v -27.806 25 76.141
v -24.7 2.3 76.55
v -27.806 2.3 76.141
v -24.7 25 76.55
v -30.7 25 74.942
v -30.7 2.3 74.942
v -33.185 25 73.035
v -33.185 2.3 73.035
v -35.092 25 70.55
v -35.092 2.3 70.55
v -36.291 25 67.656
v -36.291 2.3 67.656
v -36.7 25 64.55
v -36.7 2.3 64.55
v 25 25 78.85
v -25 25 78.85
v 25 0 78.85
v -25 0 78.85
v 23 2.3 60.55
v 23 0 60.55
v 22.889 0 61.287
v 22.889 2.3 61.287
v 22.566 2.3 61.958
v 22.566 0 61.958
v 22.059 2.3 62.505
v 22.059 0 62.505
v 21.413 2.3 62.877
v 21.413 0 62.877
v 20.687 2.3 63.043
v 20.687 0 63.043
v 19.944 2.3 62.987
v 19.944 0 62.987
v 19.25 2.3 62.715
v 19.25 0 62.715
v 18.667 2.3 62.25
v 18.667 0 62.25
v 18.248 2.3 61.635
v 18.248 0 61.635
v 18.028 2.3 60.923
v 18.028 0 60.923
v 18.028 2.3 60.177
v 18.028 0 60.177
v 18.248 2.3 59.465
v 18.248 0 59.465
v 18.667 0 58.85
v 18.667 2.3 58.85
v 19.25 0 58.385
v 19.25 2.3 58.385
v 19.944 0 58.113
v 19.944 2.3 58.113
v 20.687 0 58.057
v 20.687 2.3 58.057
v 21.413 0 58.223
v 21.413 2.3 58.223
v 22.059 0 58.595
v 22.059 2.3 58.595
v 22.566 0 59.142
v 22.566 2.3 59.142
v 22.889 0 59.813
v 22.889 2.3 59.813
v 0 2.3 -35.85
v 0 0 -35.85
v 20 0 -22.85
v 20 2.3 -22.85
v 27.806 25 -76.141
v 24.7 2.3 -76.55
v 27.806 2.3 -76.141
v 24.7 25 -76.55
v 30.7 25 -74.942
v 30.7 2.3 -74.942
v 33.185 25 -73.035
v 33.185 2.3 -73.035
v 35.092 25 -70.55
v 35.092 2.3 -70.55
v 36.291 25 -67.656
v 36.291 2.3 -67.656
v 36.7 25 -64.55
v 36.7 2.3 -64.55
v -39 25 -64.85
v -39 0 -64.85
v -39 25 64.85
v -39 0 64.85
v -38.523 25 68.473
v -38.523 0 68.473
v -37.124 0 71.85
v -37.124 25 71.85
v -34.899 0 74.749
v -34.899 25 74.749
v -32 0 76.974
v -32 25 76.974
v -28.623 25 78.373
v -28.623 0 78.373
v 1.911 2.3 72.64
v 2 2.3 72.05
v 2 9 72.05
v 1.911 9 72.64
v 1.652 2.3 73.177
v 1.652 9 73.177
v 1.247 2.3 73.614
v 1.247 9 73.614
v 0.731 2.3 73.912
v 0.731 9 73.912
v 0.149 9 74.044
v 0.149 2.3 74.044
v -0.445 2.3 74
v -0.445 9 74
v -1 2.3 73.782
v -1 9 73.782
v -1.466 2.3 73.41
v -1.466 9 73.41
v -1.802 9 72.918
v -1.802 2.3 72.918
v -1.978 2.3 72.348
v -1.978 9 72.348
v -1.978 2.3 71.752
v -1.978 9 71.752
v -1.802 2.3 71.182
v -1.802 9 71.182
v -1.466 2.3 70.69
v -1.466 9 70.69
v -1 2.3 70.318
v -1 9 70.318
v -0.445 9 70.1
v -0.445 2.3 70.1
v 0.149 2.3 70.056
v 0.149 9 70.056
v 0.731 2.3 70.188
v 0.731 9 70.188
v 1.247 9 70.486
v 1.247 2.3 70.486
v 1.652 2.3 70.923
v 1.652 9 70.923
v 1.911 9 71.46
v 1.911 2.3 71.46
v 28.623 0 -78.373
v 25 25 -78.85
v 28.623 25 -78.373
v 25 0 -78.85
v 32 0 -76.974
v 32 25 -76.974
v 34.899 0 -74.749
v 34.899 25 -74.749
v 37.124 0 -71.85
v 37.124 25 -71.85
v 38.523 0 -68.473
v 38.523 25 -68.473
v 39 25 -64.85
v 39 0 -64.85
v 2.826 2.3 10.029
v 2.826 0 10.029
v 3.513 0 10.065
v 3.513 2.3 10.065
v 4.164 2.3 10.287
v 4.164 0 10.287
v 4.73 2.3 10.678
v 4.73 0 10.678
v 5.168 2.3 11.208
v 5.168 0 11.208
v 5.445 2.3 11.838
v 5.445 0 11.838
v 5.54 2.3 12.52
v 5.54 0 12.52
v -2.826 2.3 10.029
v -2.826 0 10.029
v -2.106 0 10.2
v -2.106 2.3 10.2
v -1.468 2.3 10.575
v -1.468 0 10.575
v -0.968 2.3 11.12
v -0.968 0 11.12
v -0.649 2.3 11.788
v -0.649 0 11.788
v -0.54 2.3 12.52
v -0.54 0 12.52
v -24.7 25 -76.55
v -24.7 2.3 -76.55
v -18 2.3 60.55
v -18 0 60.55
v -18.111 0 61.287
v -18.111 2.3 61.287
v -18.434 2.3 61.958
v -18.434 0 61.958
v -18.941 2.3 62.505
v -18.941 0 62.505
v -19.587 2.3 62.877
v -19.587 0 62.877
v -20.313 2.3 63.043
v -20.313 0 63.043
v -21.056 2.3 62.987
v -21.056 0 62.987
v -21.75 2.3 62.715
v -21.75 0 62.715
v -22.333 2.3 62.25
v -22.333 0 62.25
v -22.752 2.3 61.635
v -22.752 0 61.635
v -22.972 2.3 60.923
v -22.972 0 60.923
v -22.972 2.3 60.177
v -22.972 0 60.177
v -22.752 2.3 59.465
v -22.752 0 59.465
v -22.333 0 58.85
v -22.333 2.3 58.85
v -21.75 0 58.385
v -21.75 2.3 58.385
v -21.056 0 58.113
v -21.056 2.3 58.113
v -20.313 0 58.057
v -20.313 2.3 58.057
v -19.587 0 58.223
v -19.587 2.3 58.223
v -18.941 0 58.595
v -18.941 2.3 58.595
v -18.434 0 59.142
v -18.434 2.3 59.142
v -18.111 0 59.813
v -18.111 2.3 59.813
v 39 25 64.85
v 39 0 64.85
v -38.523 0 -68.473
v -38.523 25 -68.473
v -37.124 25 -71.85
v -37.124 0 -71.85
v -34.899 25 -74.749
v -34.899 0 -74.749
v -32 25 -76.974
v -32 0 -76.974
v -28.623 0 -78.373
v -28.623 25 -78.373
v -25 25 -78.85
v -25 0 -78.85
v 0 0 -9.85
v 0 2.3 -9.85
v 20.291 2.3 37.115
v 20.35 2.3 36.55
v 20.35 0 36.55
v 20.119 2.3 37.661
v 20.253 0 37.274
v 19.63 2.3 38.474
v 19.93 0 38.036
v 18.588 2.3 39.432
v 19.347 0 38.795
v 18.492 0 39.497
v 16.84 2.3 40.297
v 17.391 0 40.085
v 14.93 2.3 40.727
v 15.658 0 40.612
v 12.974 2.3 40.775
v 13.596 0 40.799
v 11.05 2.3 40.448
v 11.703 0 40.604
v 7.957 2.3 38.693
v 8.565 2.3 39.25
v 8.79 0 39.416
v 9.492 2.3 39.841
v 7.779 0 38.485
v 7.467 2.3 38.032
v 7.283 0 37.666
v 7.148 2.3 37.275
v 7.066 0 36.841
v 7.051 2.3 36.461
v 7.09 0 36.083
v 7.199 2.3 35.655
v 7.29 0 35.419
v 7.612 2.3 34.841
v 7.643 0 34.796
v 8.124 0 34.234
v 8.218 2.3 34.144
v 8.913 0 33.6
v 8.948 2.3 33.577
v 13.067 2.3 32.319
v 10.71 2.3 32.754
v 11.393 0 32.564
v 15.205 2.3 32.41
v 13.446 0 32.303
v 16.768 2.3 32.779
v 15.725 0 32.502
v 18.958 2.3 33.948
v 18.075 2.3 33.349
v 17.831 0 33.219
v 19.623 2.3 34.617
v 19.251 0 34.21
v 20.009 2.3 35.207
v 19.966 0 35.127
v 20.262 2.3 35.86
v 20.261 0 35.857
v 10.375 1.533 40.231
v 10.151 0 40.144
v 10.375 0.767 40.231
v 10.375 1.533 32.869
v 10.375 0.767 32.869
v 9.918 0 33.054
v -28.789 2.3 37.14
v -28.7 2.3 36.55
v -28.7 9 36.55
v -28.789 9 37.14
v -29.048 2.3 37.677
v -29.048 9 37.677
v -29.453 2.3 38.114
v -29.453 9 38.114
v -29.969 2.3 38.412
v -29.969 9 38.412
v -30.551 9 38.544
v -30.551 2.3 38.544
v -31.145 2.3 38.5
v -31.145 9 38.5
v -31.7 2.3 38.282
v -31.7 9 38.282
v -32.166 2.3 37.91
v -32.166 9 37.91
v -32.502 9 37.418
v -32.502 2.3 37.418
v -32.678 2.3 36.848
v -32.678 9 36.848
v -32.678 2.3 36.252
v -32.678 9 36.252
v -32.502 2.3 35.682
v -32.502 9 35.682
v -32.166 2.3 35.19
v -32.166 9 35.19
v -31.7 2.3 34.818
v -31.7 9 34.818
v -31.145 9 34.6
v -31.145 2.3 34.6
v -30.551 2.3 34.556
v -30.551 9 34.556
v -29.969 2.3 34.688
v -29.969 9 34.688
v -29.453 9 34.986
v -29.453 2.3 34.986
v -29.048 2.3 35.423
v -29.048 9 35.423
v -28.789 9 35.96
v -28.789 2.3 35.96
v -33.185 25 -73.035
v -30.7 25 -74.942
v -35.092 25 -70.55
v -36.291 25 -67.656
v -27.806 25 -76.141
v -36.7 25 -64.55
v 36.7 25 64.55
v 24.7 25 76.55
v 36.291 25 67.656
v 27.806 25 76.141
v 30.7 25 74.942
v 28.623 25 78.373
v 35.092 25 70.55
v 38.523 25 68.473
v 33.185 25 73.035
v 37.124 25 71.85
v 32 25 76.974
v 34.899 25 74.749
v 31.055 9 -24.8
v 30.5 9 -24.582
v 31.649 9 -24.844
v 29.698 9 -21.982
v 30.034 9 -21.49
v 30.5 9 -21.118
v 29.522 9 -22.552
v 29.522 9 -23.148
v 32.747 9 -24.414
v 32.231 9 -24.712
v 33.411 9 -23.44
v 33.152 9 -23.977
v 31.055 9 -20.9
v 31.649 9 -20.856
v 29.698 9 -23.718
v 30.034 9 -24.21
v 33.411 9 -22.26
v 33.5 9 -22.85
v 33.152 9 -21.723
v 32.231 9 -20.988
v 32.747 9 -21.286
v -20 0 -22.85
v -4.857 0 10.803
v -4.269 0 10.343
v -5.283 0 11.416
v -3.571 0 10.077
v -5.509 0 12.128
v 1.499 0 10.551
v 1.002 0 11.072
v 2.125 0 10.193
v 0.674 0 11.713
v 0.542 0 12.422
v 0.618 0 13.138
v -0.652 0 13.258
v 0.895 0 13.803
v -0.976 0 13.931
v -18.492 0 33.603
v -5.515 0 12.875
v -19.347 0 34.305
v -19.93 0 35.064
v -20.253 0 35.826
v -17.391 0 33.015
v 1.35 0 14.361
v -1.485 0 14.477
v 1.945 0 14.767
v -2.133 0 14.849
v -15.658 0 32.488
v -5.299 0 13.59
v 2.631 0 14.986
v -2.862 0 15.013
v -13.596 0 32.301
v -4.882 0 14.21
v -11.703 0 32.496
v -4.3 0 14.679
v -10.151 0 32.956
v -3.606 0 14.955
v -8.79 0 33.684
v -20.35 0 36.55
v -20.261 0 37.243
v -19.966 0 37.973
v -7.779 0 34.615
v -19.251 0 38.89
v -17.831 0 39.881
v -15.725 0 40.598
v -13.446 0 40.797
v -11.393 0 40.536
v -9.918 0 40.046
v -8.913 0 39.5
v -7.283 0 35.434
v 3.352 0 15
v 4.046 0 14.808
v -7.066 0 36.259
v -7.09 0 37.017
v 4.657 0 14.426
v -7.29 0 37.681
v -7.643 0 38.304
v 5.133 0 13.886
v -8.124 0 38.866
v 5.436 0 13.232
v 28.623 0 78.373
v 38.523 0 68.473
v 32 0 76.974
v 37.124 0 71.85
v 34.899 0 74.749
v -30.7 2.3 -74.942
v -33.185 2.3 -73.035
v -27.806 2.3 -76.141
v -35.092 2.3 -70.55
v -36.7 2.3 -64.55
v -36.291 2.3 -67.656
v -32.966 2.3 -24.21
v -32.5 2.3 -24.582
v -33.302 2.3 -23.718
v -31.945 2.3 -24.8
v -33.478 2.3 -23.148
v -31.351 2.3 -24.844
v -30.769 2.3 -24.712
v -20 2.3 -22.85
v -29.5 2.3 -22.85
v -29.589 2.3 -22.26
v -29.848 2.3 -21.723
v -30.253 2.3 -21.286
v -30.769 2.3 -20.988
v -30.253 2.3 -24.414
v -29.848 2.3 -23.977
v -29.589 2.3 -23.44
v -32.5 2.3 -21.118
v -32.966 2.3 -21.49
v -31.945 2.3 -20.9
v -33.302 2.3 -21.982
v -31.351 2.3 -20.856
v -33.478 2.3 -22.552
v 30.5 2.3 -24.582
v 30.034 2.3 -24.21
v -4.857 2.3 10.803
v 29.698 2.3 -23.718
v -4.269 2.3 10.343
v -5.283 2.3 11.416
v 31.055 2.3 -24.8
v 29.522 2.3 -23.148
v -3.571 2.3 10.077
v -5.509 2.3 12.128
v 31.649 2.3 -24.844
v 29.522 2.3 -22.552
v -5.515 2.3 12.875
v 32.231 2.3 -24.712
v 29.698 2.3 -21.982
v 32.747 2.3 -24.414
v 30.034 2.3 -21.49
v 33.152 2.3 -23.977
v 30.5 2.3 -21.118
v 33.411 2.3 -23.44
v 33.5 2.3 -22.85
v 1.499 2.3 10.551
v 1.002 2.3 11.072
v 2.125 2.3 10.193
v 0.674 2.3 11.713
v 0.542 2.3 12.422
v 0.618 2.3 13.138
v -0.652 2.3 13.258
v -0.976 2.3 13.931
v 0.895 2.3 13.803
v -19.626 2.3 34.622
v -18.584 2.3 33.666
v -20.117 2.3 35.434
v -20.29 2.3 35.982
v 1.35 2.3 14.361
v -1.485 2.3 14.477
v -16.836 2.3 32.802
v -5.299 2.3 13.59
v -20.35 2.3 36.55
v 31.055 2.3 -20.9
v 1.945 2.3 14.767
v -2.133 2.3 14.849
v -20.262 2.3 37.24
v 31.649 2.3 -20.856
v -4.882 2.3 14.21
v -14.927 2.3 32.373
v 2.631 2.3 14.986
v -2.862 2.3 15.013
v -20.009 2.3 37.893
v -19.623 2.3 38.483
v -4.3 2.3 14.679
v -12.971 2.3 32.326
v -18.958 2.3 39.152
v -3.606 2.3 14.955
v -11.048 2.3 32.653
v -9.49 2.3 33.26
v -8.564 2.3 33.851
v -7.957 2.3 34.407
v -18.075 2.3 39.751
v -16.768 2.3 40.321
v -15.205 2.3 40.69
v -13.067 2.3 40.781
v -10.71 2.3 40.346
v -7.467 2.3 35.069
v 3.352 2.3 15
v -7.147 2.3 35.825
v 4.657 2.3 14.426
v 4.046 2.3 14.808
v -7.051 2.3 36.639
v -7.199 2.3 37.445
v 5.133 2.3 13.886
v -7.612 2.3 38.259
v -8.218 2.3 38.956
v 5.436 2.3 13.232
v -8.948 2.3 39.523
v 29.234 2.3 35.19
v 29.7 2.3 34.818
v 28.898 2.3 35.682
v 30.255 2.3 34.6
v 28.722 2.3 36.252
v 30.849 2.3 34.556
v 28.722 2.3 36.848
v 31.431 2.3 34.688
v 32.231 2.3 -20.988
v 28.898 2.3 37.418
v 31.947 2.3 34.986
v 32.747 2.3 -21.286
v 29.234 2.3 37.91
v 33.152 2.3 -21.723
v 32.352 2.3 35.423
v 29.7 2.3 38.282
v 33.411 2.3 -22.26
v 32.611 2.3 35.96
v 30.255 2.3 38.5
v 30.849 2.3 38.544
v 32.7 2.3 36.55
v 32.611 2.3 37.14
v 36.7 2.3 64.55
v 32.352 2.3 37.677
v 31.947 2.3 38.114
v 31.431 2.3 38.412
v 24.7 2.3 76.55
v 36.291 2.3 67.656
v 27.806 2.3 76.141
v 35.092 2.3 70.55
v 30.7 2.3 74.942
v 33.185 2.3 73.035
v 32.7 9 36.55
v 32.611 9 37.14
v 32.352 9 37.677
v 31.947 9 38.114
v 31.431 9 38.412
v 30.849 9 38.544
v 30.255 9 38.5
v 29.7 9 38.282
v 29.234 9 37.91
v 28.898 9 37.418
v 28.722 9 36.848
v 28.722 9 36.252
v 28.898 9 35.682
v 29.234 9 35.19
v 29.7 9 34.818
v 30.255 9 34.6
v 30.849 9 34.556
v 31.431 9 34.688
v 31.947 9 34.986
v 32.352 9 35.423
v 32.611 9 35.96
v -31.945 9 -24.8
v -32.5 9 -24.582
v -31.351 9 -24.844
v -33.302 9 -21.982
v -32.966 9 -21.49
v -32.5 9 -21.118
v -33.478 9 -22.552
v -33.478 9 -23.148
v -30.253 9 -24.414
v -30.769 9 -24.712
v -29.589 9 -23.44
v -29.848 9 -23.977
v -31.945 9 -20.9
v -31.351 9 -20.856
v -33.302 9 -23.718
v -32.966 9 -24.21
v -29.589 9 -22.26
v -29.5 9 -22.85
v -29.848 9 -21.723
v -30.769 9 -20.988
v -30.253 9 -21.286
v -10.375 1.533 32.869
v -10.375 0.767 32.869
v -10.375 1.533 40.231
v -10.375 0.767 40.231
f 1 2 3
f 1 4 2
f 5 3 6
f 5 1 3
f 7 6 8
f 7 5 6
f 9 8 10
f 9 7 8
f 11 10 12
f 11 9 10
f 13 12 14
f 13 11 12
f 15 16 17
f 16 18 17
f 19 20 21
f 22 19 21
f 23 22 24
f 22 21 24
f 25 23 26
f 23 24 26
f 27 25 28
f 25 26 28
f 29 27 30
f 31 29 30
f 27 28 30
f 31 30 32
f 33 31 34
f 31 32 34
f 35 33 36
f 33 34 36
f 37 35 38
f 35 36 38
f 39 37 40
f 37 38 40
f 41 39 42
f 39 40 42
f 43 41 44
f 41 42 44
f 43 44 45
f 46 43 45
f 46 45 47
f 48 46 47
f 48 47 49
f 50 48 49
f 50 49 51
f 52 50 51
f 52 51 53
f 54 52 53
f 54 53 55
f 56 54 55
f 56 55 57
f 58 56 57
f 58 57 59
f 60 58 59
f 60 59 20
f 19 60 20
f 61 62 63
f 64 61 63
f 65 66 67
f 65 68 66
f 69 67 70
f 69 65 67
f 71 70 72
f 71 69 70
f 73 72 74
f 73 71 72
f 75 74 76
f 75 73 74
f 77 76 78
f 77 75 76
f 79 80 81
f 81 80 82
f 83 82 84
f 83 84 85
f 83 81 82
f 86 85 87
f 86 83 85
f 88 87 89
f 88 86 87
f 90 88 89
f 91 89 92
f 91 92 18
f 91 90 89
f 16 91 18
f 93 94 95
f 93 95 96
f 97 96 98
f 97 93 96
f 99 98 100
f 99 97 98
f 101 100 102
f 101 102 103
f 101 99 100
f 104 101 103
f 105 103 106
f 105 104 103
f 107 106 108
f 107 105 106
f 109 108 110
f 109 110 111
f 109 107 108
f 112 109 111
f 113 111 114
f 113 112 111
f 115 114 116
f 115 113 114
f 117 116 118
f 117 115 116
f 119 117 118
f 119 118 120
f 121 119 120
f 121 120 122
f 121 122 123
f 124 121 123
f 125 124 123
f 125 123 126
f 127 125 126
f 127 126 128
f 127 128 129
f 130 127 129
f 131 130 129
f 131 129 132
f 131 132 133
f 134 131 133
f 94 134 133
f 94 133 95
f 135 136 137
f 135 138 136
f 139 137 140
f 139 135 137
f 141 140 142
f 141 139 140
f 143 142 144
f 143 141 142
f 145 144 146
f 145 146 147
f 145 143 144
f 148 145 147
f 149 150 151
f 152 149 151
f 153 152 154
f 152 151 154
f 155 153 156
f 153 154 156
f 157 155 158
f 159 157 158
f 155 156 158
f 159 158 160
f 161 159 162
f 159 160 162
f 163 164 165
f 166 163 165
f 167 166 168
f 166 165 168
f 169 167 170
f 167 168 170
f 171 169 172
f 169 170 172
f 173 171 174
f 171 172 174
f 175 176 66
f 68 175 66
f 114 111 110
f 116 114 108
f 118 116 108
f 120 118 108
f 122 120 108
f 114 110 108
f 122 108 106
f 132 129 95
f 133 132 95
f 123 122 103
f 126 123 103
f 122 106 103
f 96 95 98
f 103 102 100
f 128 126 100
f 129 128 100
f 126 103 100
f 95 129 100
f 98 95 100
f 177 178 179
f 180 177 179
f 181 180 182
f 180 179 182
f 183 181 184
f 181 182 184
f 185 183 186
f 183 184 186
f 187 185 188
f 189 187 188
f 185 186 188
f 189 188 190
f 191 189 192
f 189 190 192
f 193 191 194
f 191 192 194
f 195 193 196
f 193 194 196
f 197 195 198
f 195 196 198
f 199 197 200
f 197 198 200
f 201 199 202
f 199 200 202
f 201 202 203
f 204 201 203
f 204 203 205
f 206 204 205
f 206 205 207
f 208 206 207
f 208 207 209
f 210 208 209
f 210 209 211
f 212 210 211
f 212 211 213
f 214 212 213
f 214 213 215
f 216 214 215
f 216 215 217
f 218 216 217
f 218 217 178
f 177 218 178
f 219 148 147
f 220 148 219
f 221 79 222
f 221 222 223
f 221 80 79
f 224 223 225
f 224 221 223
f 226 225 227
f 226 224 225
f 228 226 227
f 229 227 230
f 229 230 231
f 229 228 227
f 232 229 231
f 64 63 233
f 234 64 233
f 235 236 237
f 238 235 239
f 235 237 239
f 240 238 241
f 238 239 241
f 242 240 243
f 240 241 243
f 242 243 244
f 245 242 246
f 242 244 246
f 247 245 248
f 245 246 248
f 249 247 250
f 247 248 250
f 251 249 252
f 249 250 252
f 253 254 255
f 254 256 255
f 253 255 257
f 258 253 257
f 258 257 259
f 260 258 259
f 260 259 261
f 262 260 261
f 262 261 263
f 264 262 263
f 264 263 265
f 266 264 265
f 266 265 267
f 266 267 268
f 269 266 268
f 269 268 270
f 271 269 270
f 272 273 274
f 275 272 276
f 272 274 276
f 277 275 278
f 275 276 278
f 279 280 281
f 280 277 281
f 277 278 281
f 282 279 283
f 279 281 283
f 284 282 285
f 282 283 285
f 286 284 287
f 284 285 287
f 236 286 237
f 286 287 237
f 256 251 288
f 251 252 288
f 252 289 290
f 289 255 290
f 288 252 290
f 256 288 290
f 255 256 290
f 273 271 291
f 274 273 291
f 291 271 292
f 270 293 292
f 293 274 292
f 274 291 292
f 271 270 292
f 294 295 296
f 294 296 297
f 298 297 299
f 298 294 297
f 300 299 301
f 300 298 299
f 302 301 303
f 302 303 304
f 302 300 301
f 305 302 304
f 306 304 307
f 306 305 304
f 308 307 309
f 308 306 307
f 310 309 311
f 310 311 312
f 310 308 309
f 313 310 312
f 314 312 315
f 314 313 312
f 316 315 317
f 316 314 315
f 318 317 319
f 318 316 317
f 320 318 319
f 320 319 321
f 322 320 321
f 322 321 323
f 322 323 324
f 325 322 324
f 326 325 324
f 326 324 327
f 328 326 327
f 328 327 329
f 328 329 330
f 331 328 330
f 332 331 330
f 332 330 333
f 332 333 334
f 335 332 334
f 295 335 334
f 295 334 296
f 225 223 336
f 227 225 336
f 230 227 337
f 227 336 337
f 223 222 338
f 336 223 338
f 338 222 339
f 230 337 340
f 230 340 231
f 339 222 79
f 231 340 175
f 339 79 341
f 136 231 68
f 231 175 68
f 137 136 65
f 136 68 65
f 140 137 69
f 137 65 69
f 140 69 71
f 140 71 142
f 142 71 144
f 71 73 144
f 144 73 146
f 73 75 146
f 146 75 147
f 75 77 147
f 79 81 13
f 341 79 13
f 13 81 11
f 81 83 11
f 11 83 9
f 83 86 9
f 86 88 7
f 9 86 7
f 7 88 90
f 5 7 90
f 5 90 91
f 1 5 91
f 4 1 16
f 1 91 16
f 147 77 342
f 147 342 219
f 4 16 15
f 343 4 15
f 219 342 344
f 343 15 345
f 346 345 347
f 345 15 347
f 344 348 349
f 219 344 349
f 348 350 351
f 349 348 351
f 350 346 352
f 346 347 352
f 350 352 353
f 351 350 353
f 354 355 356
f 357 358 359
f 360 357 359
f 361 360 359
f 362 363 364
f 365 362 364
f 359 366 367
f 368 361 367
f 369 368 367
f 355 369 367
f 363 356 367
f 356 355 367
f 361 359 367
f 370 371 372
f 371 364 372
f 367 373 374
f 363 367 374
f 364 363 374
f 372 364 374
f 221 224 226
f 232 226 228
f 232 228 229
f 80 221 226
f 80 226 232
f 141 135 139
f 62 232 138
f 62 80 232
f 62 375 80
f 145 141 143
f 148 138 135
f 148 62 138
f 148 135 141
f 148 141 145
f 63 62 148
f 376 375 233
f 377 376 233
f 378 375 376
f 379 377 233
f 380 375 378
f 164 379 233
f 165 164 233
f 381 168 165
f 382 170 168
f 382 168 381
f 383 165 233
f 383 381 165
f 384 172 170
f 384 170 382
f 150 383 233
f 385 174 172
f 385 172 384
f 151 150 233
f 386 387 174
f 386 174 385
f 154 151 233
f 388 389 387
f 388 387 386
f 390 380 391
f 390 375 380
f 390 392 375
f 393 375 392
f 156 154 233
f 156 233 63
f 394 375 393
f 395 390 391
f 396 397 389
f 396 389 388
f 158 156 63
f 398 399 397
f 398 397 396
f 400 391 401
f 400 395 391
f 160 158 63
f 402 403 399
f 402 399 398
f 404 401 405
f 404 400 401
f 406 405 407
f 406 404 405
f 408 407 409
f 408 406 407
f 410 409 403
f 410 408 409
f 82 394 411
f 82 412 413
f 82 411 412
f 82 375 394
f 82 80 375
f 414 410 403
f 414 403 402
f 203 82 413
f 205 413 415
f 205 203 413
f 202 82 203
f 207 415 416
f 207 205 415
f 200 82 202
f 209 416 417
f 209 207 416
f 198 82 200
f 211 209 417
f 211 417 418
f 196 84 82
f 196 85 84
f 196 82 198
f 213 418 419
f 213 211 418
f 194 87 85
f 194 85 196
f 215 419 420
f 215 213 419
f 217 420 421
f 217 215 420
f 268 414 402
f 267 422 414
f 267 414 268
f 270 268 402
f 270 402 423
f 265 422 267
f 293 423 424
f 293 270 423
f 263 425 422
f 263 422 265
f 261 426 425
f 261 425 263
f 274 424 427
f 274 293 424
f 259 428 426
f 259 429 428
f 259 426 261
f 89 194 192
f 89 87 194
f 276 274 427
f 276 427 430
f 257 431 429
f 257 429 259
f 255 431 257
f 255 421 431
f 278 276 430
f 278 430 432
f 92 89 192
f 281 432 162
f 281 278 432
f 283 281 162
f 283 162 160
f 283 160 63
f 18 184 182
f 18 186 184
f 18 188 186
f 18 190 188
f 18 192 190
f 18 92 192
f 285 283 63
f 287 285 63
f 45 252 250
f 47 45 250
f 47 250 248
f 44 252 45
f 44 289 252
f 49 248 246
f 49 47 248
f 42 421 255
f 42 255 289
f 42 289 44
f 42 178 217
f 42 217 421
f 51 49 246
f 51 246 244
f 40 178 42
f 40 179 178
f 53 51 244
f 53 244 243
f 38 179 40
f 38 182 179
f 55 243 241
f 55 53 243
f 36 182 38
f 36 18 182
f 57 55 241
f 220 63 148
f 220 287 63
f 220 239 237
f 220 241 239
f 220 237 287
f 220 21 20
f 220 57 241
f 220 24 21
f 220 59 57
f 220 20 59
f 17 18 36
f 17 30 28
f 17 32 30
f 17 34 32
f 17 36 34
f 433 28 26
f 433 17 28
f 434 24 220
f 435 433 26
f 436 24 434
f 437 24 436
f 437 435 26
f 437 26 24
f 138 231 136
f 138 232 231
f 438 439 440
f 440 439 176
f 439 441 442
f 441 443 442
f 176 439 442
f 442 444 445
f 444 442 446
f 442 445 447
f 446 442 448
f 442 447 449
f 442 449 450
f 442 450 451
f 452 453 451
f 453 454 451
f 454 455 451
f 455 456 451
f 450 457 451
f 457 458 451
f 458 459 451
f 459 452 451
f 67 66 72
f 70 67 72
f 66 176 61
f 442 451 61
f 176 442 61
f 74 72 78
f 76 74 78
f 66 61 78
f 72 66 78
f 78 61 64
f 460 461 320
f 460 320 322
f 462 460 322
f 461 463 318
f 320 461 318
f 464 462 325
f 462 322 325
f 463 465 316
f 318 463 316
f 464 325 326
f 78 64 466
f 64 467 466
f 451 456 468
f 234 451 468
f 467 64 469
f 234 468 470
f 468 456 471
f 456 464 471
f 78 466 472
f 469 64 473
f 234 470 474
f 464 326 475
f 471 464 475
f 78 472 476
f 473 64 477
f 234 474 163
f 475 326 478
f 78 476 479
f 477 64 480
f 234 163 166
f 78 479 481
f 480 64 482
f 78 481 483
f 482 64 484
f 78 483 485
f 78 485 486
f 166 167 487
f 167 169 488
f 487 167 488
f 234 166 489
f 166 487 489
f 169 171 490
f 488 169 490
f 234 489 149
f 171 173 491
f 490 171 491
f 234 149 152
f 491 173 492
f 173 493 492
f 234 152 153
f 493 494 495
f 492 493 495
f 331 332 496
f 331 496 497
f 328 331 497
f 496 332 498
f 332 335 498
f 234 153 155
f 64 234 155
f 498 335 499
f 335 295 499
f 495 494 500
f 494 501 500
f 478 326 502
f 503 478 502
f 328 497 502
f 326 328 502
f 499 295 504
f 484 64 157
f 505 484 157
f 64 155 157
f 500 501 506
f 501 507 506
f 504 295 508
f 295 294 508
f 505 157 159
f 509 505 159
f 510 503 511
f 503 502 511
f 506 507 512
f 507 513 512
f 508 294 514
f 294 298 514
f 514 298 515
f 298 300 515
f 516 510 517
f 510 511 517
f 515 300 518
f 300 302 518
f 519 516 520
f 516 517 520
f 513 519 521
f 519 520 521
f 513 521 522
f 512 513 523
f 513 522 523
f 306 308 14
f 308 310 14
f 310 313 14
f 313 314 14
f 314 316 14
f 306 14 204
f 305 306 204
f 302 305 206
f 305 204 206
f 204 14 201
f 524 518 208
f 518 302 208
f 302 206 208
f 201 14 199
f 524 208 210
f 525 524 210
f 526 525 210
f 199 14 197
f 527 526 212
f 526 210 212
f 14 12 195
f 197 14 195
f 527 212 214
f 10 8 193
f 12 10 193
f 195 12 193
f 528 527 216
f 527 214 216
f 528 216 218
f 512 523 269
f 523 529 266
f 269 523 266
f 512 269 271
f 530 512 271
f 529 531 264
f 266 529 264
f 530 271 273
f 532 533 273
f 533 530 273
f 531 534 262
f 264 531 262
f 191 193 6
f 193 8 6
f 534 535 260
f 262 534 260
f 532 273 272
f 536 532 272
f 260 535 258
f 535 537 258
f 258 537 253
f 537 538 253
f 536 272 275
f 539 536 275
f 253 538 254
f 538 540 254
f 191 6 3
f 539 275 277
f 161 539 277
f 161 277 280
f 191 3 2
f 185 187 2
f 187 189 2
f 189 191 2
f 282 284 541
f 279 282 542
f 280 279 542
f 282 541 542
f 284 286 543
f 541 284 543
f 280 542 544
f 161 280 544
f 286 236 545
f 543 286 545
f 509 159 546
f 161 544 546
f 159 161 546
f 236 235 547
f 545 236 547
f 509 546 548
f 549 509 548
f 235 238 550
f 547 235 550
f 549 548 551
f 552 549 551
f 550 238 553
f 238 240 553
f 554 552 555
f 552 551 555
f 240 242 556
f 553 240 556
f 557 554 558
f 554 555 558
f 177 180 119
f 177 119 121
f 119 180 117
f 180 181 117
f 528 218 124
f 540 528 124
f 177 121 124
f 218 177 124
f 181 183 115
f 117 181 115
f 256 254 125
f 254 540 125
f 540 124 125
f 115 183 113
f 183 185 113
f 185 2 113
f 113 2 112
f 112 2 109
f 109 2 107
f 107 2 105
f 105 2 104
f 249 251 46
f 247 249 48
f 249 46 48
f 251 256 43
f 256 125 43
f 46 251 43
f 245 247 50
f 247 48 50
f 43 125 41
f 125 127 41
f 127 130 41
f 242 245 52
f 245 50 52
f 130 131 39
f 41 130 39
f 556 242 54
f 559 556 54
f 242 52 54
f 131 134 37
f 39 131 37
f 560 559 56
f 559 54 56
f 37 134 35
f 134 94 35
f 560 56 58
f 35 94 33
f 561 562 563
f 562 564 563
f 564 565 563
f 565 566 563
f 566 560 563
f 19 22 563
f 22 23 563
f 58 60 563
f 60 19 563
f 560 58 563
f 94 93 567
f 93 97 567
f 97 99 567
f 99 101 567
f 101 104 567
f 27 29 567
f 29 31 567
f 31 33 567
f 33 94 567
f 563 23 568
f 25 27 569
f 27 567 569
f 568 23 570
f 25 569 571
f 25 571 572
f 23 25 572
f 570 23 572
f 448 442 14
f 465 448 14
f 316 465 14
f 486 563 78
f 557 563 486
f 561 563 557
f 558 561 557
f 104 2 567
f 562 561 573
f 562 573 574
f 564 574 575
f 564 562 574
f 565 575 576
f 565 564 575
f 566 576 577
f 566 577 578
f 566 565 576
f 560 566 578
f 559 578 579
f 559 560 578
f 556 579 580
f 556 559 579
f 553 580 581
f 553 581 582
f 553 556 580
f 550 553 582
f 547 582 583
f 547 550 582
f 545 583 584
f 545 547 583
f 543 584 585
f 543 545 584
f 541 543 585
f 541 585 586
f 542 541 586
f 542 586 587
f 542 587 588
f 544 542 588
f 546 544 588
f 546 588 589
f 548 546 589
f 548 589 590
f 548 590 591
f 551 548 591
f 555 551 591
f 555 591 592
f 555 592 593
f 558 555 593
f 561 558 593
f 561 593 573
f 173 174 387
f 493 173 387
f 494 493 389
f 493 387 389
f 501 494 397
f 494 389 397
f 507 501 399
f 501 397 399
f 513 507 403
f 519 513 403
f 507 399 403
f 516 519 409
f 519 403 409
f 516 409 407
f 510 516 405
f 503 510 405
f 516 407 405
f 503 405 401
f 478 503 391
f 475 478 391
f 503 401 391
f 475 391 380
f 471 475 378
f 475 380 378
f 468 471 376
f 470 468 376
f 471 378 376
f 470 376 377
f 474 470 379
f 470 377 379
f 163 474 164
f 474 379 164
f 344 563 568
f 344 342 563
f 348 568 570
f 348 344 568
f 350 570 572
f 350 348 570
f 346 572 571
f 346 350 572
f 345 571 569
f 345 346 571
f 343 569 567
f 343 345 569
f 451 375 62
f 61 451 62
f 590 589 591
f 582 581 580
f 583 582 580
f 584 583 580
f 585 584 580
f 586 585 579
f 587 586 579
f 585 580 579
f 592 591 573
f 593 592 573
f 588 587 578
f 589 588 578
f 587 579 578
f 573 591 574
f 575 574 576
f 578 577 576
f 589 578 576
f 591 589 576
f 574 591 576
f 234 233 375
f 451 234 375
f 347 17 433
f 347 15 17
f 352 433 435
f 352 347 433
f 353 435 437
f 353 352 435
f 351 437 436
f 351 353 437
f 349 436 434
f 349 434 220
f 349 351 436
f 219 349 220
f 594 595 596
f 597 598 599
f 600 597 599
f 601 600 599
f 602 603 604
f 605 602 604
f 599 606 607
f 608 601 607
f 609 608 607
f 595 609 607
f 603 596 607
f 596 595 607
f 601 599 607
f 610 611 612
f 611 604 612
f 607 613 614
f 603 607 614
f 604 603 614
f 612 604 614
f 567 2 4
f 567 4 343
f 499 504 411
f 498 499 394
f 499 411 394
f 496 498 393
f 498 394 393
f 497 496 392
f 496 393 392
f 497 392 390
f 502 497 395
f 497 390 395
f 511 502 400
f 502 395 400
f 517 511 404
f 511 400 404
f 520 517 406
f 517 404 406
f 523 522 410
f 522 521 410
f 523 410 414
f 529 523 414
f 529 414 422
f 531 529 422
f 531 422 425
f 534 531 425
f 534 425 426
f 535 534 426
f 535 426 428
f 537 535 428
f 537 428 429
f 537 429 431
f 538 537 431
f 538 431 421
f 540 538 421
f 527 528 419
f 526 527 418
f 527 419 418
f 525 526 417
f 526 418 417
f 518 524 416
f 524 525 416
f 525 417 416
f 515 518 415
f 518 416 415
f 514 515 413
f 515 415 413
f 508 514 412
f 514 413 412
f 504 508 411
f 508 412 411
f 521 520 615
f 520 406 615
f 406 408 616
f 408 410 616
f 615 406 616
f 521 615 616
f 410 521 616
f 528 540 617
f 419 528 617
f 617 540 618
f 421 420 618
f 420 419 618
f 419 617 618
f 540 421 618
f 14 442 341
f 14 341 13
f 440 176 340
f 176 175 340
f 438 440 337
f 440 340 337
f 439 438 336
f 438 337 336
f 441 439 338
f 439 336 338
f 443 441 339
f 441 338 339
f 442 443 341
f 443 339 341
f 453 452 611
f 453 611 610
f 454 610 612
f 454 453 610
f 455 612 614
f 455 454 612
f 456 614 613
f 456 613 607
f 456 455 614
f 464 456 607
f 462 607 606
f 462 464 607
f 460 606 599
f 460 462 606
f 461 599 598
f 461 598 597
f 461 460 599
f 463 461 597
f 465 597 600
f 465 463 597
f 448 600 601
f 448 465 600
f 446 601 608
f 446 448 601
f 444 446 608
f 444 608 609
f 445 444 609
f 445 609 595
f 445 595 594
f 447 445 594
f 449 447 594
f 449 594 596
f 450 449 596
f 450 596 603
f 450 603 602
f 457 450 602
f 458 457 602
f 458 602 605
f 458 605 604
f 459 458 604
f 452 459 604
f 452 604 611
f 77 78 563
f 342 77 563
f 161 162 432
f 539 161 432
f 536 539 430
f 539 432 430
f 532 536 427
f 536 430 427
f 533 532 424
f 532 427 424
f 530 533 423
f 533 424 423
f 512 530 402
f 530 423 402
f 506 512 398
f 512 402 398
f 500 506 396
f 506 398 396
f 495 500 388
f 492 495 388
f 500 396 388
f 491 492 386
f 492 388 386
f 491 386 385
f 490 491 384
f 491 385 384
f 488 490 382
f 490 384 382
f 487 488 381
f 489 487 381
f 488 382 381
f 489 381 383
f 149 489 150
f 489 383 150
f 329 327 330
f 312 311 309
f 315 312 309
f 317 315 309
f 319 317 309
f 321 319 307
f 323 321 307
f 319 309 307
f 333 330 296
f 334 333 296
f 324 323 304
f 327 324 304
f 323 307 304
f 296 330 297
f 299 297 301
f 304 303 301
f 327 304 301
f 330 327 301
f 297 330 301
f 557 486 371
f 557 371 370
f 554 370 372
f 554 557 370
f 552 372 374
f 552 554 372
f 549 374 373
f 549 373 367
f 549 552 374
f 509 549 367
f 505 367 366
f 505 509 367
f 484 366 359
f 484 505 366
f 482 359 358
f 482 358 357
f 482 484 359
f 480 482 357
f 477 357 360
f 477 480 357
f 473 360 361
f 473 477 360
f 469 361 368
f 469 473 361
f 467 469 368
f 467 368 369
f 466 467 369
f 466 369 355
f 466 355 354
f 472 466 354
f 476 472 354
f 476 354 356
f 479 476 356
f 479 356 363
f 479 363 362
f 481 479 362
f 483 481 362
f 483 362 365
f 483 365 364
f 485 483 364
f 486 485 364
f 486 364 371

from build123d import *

# Parameters (mm, degrees)
F0_W     = 78
F0_H     = 157.7
F0_W_2   = 73.4
F0_H_2   = 153.1
F0_R     = 2
F0_R_2   = 2.5
F1_DEPTH = 2.3
F2_DEPTH = 9
F3_DEPTH = 7.5
F4_DEPTH = 25
F5_R     = 12
F6_R     = 14


with BuildPart() as f1:
    # F0 (on Front) → F1 (new body)
    with BuildSketch(Plane.XZ):
        Rectangle(F0_W, F0_H)
        Rectangle(F0_W_2, F0_H_2, mode=Mode.SUBTRACT)
        Rectangle(F0_W_2, F0_H_2)
        with Locations((-31.5, -22.85)):
            Circle(F0_R, mode=Mode.SUBTRACT)
        Polygon((-20, -22.85), (0, -9.85), (20, -22.85), (0, -35.85), align=None, mode=Mode.SUBTRACT)
        with Locations((31.5, -22.85)):
            Circle(F0_R, mode=Mode.SUBTRACT)
        with Locations((-30.7, 36.55)):
            Circle(F0_R, mode=Mode.SUBTRACT)
        with BuildLine():
            add(Edge.make_bspline(
                [(-20.35, 36.55), (-20.35, 29.1887840678), (-10.375, 32.8693920339), (-0.4, 36.55), (-10.375, 40.2306079661), (-20.35, 43.9112159322), (-20.35, 36.55)],
                knots=[0, 0, 0, 2.0943951024, 2.0943951024, 4.1887902048, 4.1887902048, 6.2831853072, 6.2831853072, 6.2831853072], degree=2, weights=[1, 0.5, 1, 0.5, 1, 0.5, 1]))
        make_face(mode=Mode.SUBTRACT)
        with Locations((-20.5, 60.55)):
            Circle(F0_R_2, mode=Mode.SUBTRACT)
        with BuildLine():
            ThreePointArc((2.8259154066, 10.0287804232), (1.4142570551, 10.119681178), (0, 10.15))
            ThreePointArc((0, 10.15), (-1.4142571139, 10.1196811755), (-2.825915524, 10.0287804131))
            ThreePointArc((-2.825915524, 10.0287804131), (-5.6846492436, 9.656687973), (-8.5, 9.036517527))
            Line((-8.5, 9.036517527), (0, 26.15))
            Line((0, 26.15), (8.5, 9.036517527))
            ThreePointArc((8.5, 9.036517527), (5.6846491856, 9.6566879832), (2.8259154066, 10.0287804232))
        make_face(mode=Mode.SUBTRACT)
        with BuildLine():
            add(Edge.make_bspline(
                [(20.35, 36.55), (20.35, 43.9112159322), (10.375, 40.2306079661), (0.4, 36.55), (10.375, 32.8693920339), (20.35, 29.1887840678), (20.35, 36.55)],
                knots=[0, 0, 0, 2.0943951024, 2.0943951024, 4.1887902048, 4.1887902048, 6.2831853072, 6.2831853072, 6.2831853072], degree=2, weights=[1, 0.5, 1, 0.5, 1, 0.5, 1]))
        make_face(mode=Mode.SUBTRACT)
        with Locations((30.7, 36.55)):
            Circle(F0_R, mode=Mode.SUBTRACT)
        with Locations((0, 72.05)):
            Circle(F0_R, mode=Mode.SUBTRACT)
        with Locations((20.5, 60.55)):
            Circle(F0_R_2, mode=Mode.SUBTRACT)
        Polygon((20, -22.85), (0, -9.85), (-20, -22.85), (0, -35.85), align=None)
        with BuildLine():
            ThreePointArc((-2.825915524, 10.0287804131), (-1.4142571139, 10.1196811755), (0, 10.15))
            ThreePointArc((0, 10.15), (1.4142570551, 10.119681178), (2.8259154066, 10.0287804232))
            ThreePointArc((2.8259154066, 10.0287804232), (5.6846491856, 9.6566879832), (8.5, 9.036517527))
            Line((8.5, 9.036517527), (0, 26.15))
            Line((0, 26.15), (-8.5, 9.036517527))
            ThreePointArc((-8.5, 9.036517527), (-5.6846492436, 9.656687973), (-2.825915524, 10.0287804131))
        make_face()
        with BuildLine():
            ThreePointArc((-0.54, 12.5195971139), (-1.1980972895, 10.8292141972), (-2.825915524, 10.0287804131))
            ThreePointArc((-2.825915524, 10.0287804131), (-4.8819027105, 14.2099800306), (-0.54, 12.5195971139))
        make_face(mode=Mode.SUBTRACT)
        with BuildLine():
            ThreePointArc((5.54, 12.5195971139), (4.7303828733, 10.6776943636), (2.8259154066, 10.0287804232))
            ThreePointArc((2.8259154066, 10.0287804232), (1.3496171267, 14.3614998642), (5.54, 12.5195971139))
        make_face(mode=Mode.SUBTRACT)
        with BuildLine():
            add(Edge.make_bspline(
                [(-20.35, 36.55), (-20.35, 29.1887840678), (-10.375, 32.8693920339), (-0.4, 36.55), (-10.375, 40.2306079661), (-20.35, 43.9112159322), (-20.35, 36.55)],
                knots=[0, 0, 0, 2.0943951024, 2.0943951024, 4.1887902048, 4.1887902048, 6.2831853072, 6.2831853072, 6.2831853072], degree=2, weights=[1, 0.5, 1, 0.5, 1, 0.5, 1]))
        make_face()
        with BuildLine():
            add(Edge.make_bspline(
                [(20.35, 36.55), (20.35, 43.9112159322), (10.375, 40.2306079661), (0.4, 36.55), (10.375, 32.8693920339), (20.35, 29.1887840678), (20.35, 36.55)],
                knots=[0, 0, 0, 2.0943951024, 2.0943951024, 4.1887902048, 4.1887902048, 6.2831853072, 6.2831853072, 6.2831853072], degree=2, weights=[1, 0.5, 1, 0.5, 1, 0.5, 1]))
        make_face()
        with Locations((-20.5, 60.55)):
            Circle(F0_R_2)
        with Locations((20.5, 60.55)):
            Circle(F0_R_2)
        with BuildLine():
            ThreePointArc((-0.54, 12.5195971139), (-4.8819027105, 14.2099800306), (-2.825915524, 10.0287804131))
            ThreePointArc((-2.825915524, 10.0287804131), (-1.1980972895, 10.8292141972), (-0.54, 12.5195971139))
        make_face()
        with BuildLine():
            ThreePointArc((5.54, 12.5195971139), (1.3496171267, 14.3614998642), (2.8259154066, 10.0287804232))
            ThreePointArc((2.8259154066, 10.0287804232), (4.7303828733, 10.6776943636), (5.54, 12.5195971139))
        make_face()
        with Locations((0, 72.05)):
            Circle(F0_R)
        with Locations((30.7, 36.55)):
            Circle(F0_R)
        with Locations((-30.7, 36.55)):
            Circle(F0_R)
        with Locations((-31.5, -22.85)):
            Circle(F0_R)
        with Locations((31.5, -22.85)):
            Circle(F0_R)
    extrude(amount=-F1_DEPTH)

    # F0 (on Front) → F2 (join)
    with BuildSketch(Plane.XZ):
        with Locations((-31.5, -22.85)):
            Circle(F0_R)
        with Locations((31.5, -22.85)):
            Circle(F0_R)
        with Locations((-30.7, 36.55)):
            Circle(F0_R)
        with Locations((30.7, 36.55)):
            Circle(F0_R)
        with Locations((0, 72.05)):
            Circle(F0_R)
    extrude(amount=-F2_DEPTH)

    # F0 (on Front) → F3 (cut, symmetric)
    with BuildSketch(Plane.XZ):
        with BuildLine():
            ThreePointArc((-0.54, 12.5195971139), (-4.8819027105, 14.2099800306), (-2.825915524, 10.0287804131))
            ThreePointArc((-2.825915524, 10.0287804131), (-1.1980972895, 10.8292141972), (-0.54, 12.5195971139))
        make_face()
        with BuildLine():
            ThreePointArc((5.54, 12.5195971139), (1.3496171267, 14.3614998642), (2.8259154066, 10.0287804232))
            ThreePointArc((2.8259154066, 10.0287804232), (4.7303828733, 10.6776943636), (5.54, 12.5195971139))
        make_face()
        with Locations((-20.5, 60.55)):
            Circle(F0_R_2)
        with Locations((20.5, 60.55)):
            Circle(F0_R_2)
        with BuildLine():
            add(Edge.make_bspline(
                [(-20.35, 36.55), (-20.35, 29.1887840678), (-10.375, 32.8693920339), (-0.4, 36.55), (-10.375, 40.2306079661), (-20.35, 43.9112159322), (-20.35, 36.55)],
                knots=[0, 0, 0, 2.0943951024, 2.0943951024, 4.1887902048, 4.1887902048, 6.2831853072, 6.2831853072, 6.2831853072], degree=2, weights=[1, 0.5, 1, 0.5, 1, 0.5, 1]))
        make_face()
        with BuildLine():
            add(Edge.make_bspline(
                [(20.35, 36.55), (20.35, 43.9112159322), (10.375, 40.2306079661), (0.4, 36.55), (10.375, 32.8693920339), (20.35, 29.1887840678), (20.35, 36.55)],
                knots=[0, 0, 0, 2.0943951024, 2.0943951024, 4.1887902048, 4.1887902048, 6.2831853072, 6.2831853072, 6.2831853072], degree=2, weights=[1, 0.5, 1, 0.5, 1, 0.5, 1]))
        make_face()
        Polygon((20, -22.85), (0, -9.85), (-20, -22.85), (0, -35.85), align=None)
    extrude(amount=F3_DEPTH, both=True, mode=Mode.SUBTRACT)

    # F0 (on Front) → F4 (join)
    with BuildSketch(Plane.XZ):
        Rectangle(F0_W, F0_H)
        Rectangle(F0_W_2, F0_H_2, mode=Mode.SUBTRACT)
    extrude(amount=-F4_DEPTH)

    # F5
    f5_edges = [f1.edges().sort_by_distance(p)[0] for p in [
        (36.7, 13.65, 76.55),
        (-36.7, 13.65, 76.55),
        (36.7, 13.65, -76.55),
        (-36.7, 13.65, -76.55),
    ]]
    fillet(f5_edges, radius=F5_R)

    # F6
    f6_edges = [f1.edges().sort_by_distance(p)[0] for p in [
        (39, 12.5, -78.85),
        (-39, 12.5, -78.85),
        (-39, 12.5, 78.85),
        (39, 12.5, 78.85),
    ]]
    fillet(f6_edges, radius=F6_R)


solid = f1.part
